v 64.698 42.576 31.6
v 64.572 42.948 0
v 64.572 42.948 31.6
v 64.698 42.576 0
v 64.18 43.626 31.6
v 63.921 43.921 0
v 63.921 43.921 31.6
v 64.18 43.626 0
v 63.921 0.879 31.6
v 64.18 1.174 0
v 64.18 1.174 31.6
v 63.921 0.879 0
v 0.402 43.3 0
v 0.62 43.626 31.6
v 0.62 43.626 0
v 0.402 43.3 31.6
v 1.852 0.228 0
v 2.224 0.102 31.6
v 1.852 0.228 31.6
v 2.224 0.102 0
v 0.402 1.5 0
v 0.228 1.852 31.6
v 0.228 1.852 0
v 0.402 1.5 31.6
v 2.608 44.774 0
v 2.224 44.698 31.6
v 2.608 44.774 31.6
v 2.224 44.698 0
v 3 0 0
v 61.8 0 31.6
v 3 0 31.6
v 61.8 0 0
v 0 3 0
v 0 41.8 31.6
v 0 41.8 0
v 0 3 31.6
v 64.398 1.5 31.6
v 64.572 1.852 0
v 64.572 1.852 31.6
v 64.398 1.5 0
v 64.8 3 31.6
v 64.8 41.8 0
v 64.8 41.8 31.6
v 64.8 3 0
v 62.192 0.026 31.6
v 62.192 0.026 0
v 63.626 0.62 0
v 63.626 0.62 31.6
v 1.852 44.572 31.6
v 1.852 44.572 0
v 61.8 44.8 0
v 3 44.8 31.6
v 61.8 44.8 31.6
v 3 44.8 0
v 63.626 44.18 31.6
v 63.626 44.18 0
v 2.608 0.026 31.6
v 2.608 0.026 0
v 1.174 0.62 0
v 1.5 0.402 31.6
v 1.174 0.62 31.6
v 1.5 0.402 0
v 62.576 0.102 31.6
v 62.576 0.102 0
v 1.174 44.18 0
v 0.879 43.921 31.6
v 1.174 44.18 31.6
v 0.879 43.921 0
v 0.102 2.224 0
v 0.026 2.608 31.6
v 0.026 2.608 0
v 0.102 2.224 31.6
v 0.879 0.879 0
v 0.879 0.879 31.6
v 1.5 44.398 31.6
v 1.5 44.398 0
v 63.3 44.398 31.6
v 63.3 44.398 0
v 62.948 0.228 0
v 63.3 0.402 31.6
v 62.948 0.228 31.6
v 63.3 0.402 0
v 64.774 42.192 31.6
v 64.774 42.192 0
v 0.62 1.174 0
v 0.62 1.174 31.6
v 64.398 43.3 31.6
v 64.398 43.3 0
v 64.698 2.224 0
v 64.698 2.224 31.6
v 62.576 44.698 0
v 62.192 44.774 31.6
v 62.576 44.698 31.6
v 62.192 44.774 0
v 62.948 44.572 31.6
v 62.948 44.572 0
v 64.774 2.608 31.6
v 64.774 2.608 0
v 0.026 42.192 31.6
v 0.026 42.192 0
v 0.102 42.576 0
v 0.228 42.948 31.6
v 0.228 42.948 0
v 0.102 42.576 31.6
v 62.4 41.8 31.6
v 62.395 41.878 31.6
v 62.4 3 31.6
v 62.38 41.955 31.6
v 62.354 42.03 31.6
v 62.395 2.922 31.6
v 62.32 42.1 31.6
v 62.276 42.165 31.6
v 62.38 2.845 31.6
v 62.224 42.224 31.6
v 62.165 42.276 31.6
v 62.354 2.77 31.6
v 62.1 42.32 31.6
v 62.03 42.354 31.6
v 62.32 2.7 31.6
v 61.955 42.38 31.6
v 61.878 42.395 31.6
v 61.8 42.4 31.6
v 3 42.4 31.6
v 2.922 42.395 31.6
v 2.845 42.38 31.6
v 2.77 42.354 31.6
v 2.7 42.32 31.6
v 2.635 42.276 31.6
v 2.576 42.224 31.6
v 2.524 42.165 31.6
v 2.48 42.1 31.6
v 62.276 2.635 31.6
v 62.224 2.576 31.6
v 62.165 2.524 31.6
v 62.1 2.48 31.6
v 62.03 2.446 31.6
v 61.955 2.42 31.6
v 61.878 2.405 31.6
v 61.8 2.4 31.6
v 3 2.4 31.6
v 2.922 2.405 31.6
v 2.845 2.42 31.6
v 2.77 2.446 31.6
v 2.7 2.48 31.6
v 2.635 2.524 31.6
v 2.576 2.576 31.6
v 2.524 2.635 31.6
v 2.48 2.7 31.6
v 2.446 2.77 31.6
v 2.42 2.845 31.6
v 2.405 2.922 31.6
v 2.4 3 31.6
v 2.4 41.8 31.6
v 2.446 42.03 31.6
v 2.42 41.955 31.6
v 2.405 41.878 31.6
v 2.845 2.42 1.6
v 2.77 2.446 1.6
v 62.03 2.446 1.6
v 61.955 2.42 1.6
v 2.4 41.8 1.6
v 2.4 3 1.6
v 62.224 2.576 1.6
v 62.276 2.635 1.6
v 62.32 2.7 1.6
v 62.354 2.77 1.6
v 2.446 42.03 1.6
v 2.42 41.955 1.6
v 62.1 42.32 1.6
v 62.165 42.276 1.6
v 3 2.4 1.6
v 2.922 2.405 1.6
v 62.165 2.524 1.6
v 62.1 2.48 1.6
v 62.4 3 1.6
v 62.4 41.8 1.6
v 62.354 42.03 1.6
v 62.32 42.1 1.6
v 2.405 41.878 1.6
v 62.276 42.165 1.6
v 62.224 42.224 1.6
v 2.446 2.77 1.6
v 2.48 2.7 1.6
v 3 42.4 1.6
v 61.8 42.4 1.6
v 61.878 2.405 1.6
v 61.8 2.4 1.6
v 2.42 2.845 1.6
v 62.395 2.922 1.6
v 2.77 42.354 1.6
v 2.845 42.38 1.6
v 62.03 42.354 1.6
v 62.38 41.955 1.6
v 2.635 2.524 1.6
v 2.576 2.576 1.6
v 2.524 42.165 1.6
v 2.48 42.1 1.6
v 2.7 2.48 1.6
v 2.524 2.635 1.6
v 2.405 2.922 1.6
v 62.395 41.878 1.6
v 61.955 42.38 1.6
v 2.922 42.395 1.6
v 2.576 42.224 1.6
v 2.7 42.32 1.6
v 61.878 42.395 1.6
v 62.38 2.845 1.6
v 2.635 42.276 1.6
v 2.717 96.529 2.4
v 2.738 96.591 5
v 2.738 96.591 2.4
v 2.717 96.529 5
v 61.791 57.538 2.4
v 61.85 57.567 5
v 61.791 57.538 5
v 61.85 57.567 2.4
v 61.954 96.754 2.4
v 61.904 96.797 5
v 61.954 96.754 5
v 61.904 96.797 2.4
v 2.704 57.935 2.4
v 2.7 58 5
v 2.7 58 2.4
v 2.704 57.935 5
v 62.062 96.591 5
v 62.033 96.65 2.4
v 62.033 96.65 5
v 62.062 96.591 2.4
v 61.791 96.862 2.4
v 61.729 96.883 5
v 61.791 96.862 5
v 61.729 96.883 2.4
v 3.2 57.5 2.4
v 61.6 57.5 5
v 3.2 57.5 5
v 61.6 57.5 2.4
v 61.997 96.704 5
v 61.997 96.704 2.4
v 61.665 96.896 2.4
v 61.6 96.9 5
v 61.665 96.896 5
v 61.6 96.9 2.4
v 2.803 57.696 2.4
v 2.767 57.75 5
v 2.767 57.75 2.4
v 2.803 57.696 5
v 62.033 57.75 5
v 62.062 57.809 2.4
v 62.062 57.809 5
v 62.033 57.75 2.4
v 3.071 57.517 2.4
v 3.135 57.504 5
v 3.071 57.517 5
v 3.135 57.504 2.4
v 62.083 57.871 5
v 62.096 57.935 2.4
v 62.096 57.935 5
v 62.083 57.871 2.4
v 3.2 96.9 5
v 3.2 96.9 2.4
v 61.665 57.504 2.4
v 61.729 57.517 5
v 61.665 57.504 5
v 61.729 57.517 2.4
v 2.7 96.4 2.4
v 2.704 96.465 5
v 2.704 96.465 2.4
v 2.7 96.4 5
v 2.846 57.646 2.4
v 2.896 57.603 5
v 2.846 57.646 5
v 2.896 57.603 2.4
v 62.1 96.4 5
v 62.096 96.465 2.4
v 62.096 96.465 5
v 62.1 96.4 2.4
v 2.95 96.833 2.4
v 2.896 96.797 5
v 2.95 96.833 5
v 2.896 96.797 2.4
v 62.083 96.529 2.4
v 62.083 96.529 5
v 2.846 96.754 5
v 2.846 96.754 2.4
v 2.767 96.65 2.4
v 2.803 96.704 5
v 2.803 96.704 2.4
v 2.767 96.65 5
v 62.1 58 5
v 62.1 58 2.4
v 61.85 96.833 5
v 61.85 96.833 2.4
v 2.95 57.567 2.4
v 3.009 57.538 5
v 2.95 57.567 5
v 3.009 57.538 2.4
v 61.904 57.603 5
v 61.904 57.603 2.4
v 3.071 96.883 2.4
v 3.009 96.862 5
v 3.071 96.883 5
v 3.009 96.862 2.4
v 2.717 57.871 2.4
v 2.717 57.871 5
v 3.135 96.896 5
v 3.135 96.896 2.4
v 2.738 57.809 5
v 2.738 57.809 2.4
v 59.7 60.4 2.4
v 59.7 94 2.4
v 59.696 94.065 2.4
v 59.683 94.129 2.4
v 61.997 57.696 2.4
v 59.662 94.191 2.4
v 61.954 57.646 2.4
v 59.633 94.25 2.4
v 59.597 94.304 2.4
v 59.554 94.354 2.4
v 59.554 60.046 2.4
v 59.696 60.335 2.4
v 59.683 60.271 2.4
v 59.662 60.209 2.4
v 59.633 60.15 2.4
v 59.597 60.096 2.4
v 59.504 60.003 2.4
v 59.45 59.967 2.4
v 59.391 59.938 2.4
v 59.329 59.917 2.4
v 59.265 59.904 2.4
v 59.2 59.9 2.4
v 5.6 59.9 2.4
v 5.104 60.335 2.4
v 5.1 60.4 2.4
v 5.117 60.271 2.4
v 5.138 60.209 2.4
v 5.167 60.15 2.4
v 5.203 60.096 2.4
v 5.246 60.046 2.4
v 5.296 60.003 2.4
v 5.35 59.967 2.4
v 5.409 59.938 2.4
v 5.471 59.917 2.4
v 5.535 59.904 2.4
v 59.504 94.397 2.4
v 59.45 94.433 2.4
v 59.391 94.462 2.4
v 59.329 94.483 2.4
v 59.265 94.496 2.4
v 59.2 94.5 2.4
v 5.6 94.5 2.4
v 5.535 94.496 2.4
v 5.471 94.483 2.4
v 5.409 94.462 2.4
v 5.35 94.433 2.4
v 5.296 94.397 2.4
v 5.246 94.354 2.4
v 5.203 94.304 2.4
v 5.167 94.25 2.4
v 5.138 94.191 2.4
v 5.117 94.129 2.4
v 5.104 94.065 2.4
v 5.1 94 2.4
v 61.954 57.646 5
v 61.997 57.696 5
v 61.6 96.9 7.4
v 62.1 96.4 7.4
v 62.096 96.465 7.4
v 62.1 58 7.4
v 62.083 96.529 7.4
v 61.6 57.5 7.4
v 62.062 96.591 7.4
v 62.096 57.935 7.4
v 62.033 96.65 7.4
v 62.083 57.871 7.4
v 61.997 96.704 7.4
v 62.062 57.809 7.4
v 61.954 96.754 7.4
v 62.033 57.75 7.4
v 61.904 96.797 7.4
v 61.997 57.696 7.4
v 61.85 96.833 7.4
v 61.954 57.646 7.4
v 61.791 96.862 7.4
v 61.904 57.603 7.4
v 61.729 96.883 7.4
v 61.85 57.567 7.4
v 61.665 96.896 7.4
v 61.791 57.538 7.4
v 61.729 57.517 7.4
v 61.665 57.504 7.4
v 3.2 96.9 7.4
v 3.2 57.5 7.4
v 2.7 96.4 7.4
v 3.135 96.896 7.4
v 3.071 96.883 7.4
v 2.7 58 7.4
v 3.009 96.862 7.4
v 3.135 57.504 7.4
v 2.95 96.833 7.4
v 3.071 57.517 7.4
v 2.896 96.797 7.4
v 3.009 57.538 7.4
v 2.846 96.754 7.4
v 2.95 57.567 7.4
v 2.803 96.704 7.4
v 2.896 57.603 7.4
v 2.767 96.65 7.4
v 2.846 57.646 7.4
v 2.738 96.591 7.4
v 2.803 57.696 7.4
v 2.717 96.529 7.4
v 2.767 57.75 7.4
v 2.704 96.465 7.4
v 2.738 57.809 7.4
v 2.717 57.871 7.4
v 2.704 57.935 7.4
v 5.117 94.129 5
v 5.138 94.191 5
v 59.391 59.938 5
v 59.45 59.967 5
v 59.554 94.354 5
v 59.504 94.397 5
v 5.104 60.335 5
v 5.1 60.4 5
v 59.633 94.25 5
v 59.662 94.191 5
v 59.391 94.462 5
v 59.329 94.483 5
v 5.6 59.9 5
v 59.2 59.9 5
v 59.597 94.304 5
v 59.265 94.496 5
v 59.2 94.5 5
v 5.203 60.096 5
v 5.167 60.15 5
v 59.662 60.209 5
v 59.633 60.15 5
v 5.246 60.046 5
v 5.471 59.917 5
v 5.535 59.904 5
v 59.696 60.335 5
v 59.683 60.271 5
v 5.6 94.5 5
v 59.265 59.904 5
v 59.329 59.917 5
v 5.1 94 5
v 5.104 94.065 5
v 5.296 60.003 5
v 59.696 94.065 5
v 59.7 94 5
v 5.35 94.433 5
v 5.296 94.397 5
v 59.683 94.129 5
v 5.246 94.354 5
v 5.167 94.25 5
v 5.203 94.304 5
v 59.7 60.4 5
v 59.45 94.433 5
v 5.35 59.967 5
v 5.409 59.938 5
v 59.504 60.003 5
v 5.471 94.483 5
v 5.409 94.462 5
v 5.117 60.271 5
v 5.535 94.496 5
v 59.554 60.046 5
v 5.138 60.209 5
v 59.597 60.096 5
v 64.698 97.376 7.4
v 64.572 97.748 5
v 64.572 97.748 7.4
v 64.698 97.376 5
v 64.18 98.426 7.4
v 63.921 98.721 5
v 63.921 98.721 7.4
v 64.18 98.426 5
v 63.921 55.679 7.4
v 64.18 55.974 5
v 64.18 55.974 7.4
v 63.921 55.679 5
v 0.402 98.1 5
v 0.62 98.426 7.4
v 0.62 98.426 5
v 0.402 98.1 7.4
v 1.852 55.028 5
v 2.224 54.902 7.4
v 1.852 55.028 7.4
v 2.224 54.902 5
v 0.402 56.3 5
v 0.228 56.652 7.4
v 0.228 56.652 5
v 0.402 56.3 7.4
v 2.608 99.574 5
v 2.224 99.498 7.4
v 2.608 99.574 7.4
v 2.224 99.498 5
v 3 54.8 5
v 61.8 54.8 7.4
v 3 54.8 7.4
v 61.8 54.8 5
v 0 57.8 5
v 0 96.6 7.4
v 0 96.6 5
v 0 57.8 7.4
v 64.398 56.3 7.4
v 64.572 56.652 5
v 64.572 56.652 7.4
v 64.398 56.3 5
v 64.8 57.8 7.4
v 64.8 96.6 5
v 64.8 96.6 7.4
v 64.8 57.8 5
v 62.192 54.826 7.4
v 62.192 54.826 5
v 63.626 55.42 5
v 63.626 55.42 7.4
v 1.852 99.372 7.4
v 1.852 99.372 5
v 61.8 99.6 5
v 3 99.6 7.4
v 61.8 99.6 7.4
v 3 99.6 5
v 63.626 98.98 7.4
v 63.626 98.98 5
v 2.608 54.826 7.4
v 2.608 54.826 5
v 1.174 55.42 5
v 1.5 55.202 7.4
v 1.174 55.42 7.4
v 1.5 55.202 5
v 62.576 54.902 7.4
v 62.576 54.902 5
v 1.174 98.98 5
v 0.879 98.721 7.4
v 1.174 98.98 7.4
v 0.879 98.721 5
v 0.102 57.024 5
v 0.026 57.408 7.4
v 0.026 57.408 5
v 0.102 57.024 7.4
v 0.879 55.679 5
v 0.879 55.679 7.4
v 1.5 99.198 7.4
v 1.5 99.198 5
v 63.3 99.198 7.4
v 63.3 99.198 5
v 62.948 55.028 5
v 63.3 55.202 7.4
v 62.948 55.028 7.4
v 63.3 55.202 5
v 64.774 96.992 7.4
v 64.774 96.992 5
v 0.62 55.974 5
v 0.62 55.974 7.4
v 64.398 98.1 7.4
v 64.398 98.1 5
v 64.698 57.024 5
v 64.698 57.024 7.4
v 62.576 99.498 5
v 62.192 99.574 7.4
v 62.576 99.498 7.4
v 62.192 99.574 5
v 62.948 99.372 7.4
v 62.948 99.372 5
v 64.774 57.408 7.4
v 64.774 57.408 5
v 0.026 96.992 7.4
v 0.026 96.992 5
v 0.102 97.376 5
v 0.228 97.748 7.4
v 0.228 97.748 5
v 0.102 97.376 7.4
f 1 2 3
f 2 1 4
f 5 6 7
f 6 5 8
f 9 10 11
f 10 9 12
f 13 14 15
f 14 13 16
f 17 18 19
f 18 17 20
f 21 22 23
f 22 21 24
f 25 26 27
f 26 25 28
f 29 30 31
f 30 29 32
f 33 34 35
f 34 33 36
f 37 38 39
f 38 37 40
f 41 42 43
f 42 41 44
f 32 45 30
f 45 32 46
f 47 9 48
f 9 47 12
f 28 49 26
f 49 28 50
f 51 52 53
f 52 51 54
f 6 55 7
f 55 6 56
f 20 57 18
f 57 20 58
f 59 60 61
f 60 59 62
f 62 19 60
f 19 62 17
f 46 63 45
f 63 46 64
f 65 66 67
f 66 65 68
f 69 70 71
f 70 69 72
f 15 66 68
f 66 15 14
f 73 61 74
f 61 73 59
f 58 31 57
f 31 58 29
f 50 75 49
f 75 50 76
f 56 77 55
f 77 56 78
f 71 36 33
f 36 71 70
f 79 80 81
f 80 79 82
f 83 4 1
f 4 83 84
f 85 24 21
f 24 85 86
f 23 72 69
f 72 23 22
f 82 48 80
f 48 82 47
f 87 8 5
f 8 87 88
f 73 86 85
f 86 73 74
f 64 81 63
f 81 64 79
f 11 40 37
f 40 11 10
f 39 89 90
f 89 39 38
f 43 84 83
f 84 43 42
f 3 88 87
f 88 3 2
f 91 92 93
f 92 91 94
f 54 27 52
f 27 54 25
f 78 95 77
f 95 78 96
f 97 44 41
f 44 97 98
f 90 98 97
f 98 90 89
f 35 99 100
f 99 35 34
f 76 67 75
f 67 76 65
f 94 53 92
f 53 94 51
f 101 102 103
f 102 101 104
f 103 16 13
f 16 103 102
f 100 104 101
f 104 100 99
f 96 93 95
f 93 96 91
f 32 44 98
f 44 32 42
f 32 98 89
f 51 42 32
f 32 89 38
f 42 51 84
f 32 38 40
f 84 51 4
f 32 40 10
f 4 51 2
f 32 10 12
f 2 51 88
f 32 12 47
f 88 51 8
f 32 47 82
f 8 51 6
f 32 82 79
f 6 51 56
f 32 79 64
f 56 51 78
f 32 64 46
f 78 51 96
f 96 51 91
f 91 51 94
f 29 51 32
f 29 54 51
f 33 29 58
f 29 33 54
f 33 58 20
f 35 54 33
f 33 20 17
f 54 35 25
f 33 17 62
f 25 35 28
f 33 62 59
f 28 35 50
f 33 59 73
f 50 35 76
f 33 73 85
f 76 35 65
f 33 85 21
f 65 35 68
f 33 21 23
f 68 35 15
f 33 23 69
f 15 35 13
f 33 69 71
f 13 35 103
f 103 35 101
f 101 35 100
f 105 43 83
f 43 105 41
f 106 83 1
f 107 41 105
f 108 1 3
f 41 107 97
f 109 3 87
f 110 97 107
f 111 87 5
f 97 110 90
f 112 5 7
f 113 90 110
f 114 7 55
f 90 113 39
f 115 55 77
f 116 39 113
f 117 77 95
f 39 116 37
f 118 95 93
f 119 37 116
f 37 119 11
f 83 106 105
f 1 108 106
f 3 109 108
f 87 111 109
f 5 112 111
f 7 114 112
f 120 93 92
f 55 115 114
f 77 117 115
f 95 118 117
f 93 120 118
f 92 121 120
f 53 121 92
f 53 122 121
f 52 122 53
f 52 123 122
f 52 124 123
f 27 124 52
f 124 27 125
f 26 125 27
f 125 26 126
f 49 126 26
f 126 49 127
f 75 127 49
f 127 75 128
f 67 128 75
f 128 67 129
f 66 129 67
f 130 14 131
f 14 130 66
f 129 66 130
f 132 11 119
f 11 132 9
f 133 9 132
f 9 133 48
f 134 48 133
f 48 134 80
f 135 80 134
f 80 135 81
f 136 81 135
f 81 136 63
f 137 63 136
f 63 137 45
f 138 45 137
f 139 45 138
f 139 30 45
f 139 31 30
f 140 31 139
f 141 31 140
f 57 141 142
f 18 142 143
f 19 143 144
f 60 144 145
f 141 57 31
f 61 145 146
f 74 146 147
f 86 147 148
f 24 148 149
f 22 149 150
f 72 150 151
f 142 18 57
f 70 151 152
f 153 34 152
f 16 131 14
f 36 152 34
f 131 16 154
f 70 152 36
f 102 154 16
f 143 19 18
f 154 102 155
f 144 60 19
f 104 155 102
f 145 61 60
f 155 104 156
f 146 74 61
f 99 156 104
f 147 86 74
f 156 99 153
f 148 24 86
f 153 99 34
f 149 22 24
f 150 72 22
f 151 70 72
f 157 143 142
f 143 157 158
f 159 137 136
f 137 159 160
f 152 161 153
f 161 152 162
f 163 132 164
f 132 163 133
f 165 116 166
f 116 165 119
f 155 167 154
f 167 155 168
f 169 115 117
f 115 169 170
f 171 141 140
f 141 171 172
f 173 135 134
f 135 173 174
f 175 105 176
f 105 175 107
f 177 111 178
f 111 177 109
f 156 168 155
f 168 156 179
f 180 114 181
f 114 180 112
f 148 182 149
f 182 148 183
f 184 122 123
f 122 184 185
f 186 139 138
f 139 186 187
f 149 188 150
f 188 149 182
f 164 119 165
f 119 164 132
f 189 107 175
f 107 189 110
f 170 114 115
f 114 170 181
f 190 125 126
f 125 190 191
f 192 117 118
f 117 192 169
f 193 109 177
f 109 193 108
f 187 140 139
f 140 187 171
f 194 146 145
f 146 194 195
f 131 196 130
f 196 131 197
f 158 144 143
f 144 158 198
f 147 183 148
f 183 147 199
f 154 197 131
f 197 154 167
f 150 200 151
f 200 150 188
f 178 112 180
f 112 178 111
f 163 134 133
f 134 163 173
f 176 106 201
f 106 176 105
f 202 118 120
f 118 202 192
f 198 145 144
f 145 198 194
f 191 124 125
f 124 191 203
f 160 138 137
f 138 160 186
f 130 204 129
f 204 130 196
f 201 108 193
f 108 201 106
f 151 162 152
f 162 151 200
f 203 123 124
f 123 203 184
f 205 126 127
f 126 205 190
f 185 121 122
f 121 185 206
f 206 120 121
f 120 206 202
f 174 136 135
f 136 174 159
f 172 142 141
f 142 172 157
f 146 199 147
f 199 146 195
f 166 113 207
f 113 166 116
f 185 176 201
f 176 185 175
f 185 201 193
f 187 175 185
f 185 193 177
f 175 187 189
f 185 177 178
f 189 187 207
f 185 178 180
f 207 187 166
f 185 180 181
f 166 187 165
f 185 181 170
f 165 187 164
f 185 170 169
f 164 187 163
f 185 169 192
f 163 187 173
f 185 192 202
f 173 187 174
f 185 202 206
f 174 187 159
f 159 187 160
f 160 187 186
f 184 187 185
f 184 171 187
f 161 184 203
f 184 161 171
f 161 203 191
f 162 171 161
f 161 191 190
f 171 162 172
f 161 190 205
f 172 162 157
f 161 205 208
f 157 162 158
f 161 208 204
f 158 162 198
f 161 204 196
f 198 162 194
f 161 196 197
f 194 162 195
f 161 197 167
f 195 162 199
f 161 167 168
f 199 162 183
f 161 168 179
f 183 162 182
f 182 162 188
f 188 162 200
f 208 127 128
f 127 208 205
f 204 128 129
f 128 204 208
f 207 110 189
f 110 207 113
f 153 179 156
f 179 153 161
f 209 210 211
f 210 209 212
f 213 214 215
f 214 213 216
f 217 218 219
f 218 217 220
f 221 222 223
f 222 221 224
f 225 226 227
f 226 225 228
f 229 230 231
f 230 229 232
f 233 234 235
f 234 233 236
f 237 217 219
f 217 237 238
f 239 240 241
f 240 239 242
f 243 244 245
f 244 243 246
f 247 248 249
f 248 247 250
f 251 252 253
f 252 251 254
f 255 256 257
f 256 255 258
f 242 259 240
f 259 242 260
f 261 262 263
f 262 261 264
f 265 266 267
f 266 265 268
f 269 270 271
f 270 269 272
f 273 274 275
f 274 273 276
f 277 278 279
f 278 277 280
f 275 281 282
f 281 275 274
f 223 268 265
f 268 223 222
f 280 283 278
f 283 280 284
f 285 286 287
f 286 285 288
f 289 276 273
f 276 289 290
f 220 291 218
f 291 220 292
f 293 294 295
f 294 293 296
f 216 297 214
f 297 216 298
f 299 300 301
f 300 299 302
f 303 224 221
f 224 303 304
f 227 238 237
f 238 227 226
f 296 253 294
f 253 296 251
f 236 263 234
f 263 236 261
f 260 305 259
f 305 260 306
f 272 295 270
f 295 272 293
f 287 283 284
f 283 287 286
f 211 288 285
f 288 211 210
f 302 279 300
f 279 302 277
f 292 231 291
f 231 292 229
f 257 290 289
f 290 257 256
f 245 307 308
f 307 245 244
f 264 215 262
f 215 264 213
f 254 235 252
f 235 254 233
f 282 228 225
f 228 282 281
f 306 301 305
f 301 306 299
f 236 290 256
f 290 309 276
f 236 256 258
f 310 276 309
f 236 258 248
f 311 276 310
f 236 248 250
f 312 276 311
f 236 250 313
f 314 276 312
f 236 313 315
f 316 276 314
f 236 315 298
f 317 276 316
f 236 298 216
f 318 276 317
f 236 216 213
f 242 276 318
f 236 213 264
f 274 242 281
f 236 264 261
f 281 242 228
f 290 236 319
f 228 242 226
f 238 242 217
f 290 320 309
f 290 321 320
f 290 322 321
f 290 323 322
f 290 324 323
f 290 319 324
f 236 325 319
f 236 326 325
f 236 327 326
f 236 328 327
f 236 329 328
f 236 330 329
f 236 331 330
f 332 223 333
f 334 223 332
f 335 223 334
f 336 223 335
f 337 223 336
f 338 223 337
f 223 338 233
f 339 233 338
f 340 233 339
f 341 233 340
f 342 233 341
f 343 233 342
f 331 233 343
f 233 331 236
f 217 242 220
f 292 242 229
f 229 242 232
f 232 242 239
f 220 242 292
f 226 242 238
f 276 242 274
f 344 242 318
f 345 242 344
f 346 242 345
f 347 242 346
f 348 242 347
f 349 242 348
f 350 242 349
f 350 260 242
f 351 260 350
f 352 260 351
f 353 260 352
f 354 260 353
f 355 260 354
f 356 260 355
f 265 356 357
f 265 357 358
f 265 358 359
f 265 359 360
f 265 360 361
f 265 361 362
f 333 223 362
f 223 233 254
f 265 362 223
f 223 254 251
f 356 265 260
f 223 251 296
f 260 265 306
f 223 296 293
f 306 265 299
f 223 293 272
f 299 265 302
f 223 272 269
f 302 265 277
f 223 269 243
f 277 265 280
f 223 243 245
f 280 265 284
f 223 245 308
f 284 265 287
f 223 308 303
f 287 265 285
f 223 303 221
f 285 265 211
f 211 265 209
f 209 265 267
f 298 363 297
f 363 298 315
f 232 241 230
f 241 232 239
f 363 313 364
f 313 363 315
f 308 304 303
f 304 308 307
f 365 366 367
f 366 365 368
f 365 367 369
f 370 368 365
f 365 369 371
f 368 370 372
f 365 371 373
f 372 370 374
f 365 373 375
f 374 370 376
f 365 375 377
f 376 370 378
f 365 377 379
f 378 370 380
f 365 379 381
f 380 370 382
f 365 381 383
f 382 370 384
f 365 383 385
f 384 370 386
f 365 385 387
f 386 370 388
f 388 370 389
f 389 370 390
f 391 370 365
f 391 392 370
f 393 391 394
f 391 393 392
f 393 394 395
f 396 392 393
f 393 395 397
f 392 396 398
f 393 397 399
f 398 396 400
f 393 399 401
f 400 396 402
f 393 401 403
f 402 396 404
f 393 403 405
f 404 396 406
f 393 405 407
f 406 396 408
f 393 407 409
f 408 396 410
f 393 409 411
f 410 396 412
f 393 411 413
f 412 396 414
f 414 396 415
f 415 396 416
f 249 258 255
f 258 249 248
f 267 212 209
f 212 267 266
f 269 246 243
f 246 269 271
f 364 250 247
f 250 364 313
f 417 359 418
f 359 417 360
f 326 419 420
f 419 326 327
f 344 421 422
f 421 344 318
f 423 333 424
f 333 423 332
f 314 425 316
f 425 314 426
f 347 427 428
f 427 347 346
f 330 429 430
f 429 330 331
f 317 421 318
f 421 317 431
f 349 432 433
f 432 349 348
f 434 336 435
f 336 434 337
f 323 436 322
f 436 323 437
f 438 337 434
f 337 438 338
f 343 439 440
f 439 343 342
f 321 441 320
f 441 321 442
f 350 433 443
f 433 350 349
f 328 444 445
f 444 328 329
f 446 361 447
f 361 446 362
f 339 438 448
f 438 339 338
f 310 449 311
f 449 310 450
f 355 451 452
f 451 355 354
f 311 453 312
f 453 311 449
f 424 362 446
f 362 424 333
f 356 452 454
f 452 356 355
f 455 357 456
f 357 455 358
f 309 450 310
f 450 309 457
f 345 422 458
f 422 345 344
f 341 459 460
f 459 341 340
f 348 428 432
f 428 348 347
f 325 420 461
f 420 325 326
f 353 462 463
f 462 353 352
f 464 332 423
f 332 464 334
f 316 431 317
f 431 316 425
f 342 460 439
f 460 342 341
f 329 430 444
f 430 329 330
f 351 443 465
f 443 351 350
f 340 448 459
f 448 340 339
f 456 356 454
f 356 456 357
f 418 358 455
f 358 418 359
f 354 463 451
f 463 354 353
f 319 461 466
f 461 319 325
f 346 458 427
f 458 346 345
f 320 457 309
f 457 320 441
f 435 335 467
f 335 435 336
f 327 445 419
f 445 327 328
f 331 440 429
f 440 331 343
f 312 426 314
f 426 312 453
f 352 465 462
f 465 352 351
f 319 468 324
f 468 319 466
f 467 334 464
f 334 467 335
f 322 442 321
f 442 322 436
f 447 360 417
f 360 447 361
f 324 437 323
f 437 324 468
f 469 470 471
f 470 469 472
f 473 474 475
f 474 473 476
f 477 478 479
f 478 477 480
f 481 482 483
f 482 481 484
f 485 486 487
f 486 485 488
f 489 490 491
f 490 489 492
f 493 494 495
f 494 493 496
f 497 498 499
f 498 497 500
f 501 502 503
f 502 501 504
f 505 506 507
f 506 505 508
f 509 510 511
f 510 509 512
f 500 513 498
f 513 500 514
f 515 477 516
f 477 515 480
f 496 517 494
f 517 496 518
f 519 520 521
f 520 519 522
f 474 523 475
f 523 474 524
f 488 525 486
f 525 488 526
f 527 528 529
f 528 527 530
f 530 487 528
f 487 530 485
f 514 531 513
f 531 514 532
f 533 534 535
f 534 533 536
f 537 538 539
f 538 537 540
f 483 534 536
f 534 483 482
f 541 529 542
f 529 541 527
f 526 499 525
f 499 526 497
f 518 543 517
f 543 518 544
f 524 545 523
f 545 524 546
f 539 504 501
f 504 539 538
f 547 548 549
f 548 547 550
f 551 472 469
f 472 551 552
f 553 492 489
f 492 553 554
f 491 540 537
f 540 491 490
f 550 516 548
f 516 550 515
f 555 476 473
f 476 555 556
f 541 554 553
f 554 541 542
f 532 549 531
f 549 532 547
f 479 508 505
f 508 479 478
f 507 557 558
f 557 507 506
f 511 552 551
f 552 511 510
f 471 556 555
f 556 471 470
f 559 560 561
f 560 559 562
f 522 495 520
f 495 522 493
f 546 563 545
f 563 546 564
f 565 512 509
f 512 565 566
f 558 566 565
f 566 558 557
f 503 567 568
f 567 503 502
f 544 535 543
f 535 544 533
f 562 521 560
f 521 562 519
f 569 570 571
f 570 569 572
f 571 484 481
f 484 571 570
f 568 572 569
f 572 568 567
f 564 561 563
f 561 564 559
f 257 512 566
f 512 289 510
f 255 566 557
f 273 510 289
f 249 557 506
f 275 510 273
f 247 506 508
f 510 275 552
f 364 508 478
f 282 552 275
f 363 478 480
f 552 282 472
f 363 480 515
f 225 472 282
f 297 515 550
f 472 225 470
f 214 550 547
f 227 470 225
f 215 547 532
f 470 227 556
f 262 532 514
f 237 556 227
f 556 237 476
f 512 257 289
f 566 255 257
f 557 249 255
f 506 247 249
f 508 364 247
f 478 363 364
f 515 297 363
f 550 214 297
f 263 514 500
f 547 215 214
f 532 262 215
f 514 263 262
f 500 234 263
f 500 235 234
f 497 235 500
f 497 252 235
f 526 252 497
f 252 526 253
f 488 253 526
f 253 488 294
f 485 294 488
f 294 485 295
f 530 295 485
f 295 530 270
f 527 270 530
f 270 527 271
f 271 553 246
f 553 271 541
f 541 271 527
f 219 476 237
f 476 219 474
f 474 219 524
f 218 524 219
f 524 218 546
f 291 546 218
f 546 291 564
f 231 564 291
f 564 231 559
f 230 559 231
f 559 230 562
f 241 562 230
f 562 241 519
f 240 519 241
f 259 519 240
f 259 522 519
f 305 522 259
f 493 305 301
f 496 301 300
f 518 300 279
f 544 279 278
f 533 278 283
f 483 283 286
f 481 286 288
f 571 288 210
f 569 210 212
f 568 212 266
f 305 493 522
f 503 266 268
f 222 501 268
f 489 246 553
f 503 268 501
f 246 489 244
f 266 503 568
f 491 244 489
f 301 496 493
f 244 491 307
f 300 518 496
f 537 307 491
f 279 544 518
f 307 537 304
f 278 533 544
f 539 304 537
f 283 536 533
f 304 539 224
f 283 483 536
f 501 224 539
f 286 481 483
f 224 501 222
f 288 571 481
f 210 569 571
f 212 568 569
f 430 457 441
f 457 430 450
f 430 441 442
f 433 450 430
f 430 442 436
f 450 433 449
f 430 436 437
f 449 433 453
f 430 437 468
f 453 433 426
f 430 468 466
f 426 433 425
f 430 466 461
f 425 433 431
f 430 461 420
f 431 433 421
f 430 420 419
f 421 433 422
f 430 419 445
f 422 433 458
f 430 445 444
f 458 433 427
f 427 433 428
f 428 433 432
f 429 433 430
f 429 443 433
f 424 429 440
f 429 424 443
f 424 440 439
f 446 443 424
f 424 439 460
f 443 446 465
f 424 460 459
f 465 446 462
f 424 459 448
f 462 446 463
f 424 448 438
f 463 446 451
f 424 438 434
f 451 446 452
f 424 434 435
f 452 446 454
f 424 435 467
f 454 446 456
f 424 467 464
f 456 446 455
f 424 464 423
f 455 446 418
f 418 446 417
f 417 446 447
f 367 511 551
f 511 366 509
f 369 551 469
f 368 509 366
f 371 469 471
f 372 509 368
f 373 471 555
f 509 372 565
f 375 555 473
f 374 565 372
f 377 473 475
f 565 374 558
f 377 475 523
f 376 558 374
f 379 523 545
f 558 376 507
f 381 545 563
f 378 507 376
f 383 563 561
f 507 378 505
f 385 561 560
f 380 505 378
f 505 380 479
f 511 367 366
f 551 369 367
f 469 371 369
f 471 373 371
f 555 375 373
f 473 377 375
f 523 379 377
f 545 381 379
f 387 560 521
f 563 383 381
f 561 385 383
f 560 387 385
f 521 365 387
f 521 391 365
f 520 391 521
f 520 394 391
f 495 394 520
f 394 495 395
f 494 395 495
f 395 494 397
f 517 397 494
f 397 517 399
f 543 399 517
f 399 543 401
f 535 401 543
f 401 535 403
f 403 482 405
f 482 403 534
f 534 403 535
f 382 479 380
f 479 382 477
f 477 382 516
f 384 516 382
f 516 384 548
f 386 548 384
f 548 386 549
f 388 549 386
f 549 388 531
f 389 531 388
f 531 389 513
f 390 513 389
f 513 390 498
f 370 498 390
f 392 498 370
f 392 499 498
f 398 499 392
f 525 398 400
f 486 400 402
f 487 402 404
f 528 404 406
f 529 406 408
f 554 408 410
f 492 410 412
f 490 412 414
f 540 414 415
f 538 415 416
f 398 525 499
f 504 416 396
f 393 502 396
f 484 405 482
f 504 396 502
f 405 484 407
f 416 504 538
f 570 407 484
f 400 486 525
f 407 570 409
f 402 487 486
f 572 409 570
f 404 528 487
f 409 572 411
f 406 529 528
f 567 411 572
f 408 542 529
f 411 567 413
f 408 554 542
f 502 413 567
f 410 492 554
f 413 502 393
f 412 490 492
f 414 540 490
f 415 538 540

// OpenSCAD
// ============================================
// PARAMETRIC BOX WITH LID
// A complete example demonstrating best practices
// ============================================

/* [Box Dimensions] */
inner_width = 60;       // Inner width in mm
inner_depth = 40;       // Inner depth in mm
inner_height = 30;      // Inner height in mm

/* [Structure] */
wall_thickness = 2.4;   // Wall thickness (multiple of 0.4mm nozzle)
base_thickness = 1.6;   // Base thickness (multiple of 0.2mm layer)
corner_radius = 3;      // Corner rounding radius

/* [Lid Options] */
lid_style = "friction"; // [friction, snap, screw]
lid_clearance = 0.3;    // Gap between lid and box
lid_overlap = 5;        // How far lid lip extends into box

/* [Features] */
include_divider = false; // Add internal divider
divider_position = 0.5;  // Divider position (0-1)

/* [Hidden] */
$fn = $preview ? 24 : 48;
epsilon = 0.01;

// ============================================
// DERIVED DIMENSIONS
// ============================================

outer_width = inner_width + 2 * wall_thickness;
outer_depth = inner_depth + 2 * wall_thickness;
outer_height = inner_height + base_thickness;

lip_width = inner_width - 2 * lid_clearance;
lip_depth = inner_depth - 2 * lid_clearance;

// ============================================
// VALIDATION
// ============================================

assert(wall_thickness >= 1.2, "Wall thickness must be at least 1.2mm");
assert(base_thickness >= 0.8, "Base thickness must be at least 0.8mm");
assert(corner_radius < min(inner_width, inner_depth) / 2,
       "Corner radius too large for box dimensions");
assert(lid_overlap < inner_height / 2,
       "Lid overlap cannot exceed half the inner height");

// ============================================
// MODULES
// ============================================

module rounded_box(size, r) {
    hull() {
        for (x = [r, size[0] - r])
        for (y = [r, size[1] - r])
            translate([x, y, 0])
            cylinder(r = r, h = size[2]);
    }
}

module box_base() {
    inner_r = max(corner_radius - wall_thickness, 0.5);

    difference() {
        // Outer shell
        rounded_box([outer_width, outer_depth, outer_height], corner_radius);

        // Inner cavity
        translate([wall_thickness, wall_thickness, base_thickness])
            rounded_box([inner_width, inner_depth, inner_height + epsilon],
                       inner_r);
    }

    // Optional divider
    if (include_divider) {
        translate([wall_thickness + inner_width * divider_position - wall_thickness/2,
                  wall_thickness,
                  base_thickness])
            cube([wall_thickness, inner_depth, inner_height * 0.8]);
    }
}

module lid_friction() {
    lip_r = max(corner_radius - wall_thickness - lid_clearance, 0.5);

    // Top plate
    rounded_box([outer_width, outer_depth, wall_thickness], corner_radius);

    // Inner lip (hollow for weight reduction)
    translate([wall_thickness + lid_clearance,
               wall_thickness + lid_clearance,
               -lid_overlap + wall_thickness])
        difference() {
            rounded_box([lip_width, lip_depth, lid_overlap], lip_r);
            translate([wall_thickness, wall_thickness, -epsilon])
                rounded_box([lip_width - 2*wall_thickness,
                            lip_depth - 2*wall_thickness,
                            lid_overlap + epsilon], max(lip_r - wall_thickness, 0.5));
        }
}

module lid_snap() {
    snap_depth = 1.0;
    snap_height = 3.0;
    tab_width = 15;

    lid_friction();  // Base lid shape

    // Snap tabs on sides
    for (y = [outer_depth * 0.3, outer_depth * 0.7]) {
        // Left side
        translate([wall_thickness + lid_clearance - snap_depth,
                  y - tab_width/2,
                  -lid_overlap + wall_thickness])
            snap_tab(tab_width, snap_depth, snap_height);

        // Right side
        translate([outer_width - wall_thickness - lid_clearance,
                  y - tab_width/2,
                  -lid_overlap + wall_thickness])
            mirror([1, 0, 0]) snap_tab(tab_width, snap_depth, snap_height);
    }
}

module snap_tab(width, depth, height) {
    hull() {
        cube([depth, width, height * 0.3]);
        translate([0, 0, height * 0.5])
            cube([depth * 1.5, width, height * 0.3]);
    }
}

module lid_screw() {
    screw_inset = 8;

    difference() {
        lid_friction();

        // Countersunk screw holes
        for (x = [screw_inset, outer_width - screw_inset])
        for (y = [screw_inset, outer_depth - screw_inset]) {
            translate([x, y, -epsilon])
                countersink(3, wall_thickness + 2*epsilon);
        }
    }
}

// Countersink module
module countersink(screw_size, through_depth) {
    cs_d = screw_size * 2 + 0.5;
    hole_d = screw_size + 0.4;
    cs_depth = (cs_d - hole_d) / 2;

    cylinder(h = through_depth, d = hole_d, $fn = 24);
    translate([0, 0, through_depth - cs_depth - epsilon])
        cylinder(h = cs_depth + epsilon, d1 = hole_d, d2 = cs_d, $fn = 32);
}

// ============================================
// RENDER
// ============================================

// Box base
color("SteelBlue") box_base();

// Lid (offset for visualization)
translate([0, outer_depth + 10, lid_overlap]) {
    color("LightSteelBlue")
    if (lid_style == "friction") {
        lid_friction();
    } else if (lid_style == "snap") {
        lid_snap();
    } else if (lid_style == "screw") {
        lid_screw();
    }
}

// ============================================
// INFO OUTPUT
// ============================================

echo(str("=== Box Dimensions ==="));
echo(str("Outer: ", outer_width, " × ", outer_depth, " × ", outer_height, " mm"));
echo(str("Inner: ", inner_width, " × ", inner_depth, " × ", inner_height, " mm"));
echo(str("Wall: ", wall_thickness, " mm, Base: ", base_thickness, " mm"));
echo(str("Lid style: ", lid_style));
